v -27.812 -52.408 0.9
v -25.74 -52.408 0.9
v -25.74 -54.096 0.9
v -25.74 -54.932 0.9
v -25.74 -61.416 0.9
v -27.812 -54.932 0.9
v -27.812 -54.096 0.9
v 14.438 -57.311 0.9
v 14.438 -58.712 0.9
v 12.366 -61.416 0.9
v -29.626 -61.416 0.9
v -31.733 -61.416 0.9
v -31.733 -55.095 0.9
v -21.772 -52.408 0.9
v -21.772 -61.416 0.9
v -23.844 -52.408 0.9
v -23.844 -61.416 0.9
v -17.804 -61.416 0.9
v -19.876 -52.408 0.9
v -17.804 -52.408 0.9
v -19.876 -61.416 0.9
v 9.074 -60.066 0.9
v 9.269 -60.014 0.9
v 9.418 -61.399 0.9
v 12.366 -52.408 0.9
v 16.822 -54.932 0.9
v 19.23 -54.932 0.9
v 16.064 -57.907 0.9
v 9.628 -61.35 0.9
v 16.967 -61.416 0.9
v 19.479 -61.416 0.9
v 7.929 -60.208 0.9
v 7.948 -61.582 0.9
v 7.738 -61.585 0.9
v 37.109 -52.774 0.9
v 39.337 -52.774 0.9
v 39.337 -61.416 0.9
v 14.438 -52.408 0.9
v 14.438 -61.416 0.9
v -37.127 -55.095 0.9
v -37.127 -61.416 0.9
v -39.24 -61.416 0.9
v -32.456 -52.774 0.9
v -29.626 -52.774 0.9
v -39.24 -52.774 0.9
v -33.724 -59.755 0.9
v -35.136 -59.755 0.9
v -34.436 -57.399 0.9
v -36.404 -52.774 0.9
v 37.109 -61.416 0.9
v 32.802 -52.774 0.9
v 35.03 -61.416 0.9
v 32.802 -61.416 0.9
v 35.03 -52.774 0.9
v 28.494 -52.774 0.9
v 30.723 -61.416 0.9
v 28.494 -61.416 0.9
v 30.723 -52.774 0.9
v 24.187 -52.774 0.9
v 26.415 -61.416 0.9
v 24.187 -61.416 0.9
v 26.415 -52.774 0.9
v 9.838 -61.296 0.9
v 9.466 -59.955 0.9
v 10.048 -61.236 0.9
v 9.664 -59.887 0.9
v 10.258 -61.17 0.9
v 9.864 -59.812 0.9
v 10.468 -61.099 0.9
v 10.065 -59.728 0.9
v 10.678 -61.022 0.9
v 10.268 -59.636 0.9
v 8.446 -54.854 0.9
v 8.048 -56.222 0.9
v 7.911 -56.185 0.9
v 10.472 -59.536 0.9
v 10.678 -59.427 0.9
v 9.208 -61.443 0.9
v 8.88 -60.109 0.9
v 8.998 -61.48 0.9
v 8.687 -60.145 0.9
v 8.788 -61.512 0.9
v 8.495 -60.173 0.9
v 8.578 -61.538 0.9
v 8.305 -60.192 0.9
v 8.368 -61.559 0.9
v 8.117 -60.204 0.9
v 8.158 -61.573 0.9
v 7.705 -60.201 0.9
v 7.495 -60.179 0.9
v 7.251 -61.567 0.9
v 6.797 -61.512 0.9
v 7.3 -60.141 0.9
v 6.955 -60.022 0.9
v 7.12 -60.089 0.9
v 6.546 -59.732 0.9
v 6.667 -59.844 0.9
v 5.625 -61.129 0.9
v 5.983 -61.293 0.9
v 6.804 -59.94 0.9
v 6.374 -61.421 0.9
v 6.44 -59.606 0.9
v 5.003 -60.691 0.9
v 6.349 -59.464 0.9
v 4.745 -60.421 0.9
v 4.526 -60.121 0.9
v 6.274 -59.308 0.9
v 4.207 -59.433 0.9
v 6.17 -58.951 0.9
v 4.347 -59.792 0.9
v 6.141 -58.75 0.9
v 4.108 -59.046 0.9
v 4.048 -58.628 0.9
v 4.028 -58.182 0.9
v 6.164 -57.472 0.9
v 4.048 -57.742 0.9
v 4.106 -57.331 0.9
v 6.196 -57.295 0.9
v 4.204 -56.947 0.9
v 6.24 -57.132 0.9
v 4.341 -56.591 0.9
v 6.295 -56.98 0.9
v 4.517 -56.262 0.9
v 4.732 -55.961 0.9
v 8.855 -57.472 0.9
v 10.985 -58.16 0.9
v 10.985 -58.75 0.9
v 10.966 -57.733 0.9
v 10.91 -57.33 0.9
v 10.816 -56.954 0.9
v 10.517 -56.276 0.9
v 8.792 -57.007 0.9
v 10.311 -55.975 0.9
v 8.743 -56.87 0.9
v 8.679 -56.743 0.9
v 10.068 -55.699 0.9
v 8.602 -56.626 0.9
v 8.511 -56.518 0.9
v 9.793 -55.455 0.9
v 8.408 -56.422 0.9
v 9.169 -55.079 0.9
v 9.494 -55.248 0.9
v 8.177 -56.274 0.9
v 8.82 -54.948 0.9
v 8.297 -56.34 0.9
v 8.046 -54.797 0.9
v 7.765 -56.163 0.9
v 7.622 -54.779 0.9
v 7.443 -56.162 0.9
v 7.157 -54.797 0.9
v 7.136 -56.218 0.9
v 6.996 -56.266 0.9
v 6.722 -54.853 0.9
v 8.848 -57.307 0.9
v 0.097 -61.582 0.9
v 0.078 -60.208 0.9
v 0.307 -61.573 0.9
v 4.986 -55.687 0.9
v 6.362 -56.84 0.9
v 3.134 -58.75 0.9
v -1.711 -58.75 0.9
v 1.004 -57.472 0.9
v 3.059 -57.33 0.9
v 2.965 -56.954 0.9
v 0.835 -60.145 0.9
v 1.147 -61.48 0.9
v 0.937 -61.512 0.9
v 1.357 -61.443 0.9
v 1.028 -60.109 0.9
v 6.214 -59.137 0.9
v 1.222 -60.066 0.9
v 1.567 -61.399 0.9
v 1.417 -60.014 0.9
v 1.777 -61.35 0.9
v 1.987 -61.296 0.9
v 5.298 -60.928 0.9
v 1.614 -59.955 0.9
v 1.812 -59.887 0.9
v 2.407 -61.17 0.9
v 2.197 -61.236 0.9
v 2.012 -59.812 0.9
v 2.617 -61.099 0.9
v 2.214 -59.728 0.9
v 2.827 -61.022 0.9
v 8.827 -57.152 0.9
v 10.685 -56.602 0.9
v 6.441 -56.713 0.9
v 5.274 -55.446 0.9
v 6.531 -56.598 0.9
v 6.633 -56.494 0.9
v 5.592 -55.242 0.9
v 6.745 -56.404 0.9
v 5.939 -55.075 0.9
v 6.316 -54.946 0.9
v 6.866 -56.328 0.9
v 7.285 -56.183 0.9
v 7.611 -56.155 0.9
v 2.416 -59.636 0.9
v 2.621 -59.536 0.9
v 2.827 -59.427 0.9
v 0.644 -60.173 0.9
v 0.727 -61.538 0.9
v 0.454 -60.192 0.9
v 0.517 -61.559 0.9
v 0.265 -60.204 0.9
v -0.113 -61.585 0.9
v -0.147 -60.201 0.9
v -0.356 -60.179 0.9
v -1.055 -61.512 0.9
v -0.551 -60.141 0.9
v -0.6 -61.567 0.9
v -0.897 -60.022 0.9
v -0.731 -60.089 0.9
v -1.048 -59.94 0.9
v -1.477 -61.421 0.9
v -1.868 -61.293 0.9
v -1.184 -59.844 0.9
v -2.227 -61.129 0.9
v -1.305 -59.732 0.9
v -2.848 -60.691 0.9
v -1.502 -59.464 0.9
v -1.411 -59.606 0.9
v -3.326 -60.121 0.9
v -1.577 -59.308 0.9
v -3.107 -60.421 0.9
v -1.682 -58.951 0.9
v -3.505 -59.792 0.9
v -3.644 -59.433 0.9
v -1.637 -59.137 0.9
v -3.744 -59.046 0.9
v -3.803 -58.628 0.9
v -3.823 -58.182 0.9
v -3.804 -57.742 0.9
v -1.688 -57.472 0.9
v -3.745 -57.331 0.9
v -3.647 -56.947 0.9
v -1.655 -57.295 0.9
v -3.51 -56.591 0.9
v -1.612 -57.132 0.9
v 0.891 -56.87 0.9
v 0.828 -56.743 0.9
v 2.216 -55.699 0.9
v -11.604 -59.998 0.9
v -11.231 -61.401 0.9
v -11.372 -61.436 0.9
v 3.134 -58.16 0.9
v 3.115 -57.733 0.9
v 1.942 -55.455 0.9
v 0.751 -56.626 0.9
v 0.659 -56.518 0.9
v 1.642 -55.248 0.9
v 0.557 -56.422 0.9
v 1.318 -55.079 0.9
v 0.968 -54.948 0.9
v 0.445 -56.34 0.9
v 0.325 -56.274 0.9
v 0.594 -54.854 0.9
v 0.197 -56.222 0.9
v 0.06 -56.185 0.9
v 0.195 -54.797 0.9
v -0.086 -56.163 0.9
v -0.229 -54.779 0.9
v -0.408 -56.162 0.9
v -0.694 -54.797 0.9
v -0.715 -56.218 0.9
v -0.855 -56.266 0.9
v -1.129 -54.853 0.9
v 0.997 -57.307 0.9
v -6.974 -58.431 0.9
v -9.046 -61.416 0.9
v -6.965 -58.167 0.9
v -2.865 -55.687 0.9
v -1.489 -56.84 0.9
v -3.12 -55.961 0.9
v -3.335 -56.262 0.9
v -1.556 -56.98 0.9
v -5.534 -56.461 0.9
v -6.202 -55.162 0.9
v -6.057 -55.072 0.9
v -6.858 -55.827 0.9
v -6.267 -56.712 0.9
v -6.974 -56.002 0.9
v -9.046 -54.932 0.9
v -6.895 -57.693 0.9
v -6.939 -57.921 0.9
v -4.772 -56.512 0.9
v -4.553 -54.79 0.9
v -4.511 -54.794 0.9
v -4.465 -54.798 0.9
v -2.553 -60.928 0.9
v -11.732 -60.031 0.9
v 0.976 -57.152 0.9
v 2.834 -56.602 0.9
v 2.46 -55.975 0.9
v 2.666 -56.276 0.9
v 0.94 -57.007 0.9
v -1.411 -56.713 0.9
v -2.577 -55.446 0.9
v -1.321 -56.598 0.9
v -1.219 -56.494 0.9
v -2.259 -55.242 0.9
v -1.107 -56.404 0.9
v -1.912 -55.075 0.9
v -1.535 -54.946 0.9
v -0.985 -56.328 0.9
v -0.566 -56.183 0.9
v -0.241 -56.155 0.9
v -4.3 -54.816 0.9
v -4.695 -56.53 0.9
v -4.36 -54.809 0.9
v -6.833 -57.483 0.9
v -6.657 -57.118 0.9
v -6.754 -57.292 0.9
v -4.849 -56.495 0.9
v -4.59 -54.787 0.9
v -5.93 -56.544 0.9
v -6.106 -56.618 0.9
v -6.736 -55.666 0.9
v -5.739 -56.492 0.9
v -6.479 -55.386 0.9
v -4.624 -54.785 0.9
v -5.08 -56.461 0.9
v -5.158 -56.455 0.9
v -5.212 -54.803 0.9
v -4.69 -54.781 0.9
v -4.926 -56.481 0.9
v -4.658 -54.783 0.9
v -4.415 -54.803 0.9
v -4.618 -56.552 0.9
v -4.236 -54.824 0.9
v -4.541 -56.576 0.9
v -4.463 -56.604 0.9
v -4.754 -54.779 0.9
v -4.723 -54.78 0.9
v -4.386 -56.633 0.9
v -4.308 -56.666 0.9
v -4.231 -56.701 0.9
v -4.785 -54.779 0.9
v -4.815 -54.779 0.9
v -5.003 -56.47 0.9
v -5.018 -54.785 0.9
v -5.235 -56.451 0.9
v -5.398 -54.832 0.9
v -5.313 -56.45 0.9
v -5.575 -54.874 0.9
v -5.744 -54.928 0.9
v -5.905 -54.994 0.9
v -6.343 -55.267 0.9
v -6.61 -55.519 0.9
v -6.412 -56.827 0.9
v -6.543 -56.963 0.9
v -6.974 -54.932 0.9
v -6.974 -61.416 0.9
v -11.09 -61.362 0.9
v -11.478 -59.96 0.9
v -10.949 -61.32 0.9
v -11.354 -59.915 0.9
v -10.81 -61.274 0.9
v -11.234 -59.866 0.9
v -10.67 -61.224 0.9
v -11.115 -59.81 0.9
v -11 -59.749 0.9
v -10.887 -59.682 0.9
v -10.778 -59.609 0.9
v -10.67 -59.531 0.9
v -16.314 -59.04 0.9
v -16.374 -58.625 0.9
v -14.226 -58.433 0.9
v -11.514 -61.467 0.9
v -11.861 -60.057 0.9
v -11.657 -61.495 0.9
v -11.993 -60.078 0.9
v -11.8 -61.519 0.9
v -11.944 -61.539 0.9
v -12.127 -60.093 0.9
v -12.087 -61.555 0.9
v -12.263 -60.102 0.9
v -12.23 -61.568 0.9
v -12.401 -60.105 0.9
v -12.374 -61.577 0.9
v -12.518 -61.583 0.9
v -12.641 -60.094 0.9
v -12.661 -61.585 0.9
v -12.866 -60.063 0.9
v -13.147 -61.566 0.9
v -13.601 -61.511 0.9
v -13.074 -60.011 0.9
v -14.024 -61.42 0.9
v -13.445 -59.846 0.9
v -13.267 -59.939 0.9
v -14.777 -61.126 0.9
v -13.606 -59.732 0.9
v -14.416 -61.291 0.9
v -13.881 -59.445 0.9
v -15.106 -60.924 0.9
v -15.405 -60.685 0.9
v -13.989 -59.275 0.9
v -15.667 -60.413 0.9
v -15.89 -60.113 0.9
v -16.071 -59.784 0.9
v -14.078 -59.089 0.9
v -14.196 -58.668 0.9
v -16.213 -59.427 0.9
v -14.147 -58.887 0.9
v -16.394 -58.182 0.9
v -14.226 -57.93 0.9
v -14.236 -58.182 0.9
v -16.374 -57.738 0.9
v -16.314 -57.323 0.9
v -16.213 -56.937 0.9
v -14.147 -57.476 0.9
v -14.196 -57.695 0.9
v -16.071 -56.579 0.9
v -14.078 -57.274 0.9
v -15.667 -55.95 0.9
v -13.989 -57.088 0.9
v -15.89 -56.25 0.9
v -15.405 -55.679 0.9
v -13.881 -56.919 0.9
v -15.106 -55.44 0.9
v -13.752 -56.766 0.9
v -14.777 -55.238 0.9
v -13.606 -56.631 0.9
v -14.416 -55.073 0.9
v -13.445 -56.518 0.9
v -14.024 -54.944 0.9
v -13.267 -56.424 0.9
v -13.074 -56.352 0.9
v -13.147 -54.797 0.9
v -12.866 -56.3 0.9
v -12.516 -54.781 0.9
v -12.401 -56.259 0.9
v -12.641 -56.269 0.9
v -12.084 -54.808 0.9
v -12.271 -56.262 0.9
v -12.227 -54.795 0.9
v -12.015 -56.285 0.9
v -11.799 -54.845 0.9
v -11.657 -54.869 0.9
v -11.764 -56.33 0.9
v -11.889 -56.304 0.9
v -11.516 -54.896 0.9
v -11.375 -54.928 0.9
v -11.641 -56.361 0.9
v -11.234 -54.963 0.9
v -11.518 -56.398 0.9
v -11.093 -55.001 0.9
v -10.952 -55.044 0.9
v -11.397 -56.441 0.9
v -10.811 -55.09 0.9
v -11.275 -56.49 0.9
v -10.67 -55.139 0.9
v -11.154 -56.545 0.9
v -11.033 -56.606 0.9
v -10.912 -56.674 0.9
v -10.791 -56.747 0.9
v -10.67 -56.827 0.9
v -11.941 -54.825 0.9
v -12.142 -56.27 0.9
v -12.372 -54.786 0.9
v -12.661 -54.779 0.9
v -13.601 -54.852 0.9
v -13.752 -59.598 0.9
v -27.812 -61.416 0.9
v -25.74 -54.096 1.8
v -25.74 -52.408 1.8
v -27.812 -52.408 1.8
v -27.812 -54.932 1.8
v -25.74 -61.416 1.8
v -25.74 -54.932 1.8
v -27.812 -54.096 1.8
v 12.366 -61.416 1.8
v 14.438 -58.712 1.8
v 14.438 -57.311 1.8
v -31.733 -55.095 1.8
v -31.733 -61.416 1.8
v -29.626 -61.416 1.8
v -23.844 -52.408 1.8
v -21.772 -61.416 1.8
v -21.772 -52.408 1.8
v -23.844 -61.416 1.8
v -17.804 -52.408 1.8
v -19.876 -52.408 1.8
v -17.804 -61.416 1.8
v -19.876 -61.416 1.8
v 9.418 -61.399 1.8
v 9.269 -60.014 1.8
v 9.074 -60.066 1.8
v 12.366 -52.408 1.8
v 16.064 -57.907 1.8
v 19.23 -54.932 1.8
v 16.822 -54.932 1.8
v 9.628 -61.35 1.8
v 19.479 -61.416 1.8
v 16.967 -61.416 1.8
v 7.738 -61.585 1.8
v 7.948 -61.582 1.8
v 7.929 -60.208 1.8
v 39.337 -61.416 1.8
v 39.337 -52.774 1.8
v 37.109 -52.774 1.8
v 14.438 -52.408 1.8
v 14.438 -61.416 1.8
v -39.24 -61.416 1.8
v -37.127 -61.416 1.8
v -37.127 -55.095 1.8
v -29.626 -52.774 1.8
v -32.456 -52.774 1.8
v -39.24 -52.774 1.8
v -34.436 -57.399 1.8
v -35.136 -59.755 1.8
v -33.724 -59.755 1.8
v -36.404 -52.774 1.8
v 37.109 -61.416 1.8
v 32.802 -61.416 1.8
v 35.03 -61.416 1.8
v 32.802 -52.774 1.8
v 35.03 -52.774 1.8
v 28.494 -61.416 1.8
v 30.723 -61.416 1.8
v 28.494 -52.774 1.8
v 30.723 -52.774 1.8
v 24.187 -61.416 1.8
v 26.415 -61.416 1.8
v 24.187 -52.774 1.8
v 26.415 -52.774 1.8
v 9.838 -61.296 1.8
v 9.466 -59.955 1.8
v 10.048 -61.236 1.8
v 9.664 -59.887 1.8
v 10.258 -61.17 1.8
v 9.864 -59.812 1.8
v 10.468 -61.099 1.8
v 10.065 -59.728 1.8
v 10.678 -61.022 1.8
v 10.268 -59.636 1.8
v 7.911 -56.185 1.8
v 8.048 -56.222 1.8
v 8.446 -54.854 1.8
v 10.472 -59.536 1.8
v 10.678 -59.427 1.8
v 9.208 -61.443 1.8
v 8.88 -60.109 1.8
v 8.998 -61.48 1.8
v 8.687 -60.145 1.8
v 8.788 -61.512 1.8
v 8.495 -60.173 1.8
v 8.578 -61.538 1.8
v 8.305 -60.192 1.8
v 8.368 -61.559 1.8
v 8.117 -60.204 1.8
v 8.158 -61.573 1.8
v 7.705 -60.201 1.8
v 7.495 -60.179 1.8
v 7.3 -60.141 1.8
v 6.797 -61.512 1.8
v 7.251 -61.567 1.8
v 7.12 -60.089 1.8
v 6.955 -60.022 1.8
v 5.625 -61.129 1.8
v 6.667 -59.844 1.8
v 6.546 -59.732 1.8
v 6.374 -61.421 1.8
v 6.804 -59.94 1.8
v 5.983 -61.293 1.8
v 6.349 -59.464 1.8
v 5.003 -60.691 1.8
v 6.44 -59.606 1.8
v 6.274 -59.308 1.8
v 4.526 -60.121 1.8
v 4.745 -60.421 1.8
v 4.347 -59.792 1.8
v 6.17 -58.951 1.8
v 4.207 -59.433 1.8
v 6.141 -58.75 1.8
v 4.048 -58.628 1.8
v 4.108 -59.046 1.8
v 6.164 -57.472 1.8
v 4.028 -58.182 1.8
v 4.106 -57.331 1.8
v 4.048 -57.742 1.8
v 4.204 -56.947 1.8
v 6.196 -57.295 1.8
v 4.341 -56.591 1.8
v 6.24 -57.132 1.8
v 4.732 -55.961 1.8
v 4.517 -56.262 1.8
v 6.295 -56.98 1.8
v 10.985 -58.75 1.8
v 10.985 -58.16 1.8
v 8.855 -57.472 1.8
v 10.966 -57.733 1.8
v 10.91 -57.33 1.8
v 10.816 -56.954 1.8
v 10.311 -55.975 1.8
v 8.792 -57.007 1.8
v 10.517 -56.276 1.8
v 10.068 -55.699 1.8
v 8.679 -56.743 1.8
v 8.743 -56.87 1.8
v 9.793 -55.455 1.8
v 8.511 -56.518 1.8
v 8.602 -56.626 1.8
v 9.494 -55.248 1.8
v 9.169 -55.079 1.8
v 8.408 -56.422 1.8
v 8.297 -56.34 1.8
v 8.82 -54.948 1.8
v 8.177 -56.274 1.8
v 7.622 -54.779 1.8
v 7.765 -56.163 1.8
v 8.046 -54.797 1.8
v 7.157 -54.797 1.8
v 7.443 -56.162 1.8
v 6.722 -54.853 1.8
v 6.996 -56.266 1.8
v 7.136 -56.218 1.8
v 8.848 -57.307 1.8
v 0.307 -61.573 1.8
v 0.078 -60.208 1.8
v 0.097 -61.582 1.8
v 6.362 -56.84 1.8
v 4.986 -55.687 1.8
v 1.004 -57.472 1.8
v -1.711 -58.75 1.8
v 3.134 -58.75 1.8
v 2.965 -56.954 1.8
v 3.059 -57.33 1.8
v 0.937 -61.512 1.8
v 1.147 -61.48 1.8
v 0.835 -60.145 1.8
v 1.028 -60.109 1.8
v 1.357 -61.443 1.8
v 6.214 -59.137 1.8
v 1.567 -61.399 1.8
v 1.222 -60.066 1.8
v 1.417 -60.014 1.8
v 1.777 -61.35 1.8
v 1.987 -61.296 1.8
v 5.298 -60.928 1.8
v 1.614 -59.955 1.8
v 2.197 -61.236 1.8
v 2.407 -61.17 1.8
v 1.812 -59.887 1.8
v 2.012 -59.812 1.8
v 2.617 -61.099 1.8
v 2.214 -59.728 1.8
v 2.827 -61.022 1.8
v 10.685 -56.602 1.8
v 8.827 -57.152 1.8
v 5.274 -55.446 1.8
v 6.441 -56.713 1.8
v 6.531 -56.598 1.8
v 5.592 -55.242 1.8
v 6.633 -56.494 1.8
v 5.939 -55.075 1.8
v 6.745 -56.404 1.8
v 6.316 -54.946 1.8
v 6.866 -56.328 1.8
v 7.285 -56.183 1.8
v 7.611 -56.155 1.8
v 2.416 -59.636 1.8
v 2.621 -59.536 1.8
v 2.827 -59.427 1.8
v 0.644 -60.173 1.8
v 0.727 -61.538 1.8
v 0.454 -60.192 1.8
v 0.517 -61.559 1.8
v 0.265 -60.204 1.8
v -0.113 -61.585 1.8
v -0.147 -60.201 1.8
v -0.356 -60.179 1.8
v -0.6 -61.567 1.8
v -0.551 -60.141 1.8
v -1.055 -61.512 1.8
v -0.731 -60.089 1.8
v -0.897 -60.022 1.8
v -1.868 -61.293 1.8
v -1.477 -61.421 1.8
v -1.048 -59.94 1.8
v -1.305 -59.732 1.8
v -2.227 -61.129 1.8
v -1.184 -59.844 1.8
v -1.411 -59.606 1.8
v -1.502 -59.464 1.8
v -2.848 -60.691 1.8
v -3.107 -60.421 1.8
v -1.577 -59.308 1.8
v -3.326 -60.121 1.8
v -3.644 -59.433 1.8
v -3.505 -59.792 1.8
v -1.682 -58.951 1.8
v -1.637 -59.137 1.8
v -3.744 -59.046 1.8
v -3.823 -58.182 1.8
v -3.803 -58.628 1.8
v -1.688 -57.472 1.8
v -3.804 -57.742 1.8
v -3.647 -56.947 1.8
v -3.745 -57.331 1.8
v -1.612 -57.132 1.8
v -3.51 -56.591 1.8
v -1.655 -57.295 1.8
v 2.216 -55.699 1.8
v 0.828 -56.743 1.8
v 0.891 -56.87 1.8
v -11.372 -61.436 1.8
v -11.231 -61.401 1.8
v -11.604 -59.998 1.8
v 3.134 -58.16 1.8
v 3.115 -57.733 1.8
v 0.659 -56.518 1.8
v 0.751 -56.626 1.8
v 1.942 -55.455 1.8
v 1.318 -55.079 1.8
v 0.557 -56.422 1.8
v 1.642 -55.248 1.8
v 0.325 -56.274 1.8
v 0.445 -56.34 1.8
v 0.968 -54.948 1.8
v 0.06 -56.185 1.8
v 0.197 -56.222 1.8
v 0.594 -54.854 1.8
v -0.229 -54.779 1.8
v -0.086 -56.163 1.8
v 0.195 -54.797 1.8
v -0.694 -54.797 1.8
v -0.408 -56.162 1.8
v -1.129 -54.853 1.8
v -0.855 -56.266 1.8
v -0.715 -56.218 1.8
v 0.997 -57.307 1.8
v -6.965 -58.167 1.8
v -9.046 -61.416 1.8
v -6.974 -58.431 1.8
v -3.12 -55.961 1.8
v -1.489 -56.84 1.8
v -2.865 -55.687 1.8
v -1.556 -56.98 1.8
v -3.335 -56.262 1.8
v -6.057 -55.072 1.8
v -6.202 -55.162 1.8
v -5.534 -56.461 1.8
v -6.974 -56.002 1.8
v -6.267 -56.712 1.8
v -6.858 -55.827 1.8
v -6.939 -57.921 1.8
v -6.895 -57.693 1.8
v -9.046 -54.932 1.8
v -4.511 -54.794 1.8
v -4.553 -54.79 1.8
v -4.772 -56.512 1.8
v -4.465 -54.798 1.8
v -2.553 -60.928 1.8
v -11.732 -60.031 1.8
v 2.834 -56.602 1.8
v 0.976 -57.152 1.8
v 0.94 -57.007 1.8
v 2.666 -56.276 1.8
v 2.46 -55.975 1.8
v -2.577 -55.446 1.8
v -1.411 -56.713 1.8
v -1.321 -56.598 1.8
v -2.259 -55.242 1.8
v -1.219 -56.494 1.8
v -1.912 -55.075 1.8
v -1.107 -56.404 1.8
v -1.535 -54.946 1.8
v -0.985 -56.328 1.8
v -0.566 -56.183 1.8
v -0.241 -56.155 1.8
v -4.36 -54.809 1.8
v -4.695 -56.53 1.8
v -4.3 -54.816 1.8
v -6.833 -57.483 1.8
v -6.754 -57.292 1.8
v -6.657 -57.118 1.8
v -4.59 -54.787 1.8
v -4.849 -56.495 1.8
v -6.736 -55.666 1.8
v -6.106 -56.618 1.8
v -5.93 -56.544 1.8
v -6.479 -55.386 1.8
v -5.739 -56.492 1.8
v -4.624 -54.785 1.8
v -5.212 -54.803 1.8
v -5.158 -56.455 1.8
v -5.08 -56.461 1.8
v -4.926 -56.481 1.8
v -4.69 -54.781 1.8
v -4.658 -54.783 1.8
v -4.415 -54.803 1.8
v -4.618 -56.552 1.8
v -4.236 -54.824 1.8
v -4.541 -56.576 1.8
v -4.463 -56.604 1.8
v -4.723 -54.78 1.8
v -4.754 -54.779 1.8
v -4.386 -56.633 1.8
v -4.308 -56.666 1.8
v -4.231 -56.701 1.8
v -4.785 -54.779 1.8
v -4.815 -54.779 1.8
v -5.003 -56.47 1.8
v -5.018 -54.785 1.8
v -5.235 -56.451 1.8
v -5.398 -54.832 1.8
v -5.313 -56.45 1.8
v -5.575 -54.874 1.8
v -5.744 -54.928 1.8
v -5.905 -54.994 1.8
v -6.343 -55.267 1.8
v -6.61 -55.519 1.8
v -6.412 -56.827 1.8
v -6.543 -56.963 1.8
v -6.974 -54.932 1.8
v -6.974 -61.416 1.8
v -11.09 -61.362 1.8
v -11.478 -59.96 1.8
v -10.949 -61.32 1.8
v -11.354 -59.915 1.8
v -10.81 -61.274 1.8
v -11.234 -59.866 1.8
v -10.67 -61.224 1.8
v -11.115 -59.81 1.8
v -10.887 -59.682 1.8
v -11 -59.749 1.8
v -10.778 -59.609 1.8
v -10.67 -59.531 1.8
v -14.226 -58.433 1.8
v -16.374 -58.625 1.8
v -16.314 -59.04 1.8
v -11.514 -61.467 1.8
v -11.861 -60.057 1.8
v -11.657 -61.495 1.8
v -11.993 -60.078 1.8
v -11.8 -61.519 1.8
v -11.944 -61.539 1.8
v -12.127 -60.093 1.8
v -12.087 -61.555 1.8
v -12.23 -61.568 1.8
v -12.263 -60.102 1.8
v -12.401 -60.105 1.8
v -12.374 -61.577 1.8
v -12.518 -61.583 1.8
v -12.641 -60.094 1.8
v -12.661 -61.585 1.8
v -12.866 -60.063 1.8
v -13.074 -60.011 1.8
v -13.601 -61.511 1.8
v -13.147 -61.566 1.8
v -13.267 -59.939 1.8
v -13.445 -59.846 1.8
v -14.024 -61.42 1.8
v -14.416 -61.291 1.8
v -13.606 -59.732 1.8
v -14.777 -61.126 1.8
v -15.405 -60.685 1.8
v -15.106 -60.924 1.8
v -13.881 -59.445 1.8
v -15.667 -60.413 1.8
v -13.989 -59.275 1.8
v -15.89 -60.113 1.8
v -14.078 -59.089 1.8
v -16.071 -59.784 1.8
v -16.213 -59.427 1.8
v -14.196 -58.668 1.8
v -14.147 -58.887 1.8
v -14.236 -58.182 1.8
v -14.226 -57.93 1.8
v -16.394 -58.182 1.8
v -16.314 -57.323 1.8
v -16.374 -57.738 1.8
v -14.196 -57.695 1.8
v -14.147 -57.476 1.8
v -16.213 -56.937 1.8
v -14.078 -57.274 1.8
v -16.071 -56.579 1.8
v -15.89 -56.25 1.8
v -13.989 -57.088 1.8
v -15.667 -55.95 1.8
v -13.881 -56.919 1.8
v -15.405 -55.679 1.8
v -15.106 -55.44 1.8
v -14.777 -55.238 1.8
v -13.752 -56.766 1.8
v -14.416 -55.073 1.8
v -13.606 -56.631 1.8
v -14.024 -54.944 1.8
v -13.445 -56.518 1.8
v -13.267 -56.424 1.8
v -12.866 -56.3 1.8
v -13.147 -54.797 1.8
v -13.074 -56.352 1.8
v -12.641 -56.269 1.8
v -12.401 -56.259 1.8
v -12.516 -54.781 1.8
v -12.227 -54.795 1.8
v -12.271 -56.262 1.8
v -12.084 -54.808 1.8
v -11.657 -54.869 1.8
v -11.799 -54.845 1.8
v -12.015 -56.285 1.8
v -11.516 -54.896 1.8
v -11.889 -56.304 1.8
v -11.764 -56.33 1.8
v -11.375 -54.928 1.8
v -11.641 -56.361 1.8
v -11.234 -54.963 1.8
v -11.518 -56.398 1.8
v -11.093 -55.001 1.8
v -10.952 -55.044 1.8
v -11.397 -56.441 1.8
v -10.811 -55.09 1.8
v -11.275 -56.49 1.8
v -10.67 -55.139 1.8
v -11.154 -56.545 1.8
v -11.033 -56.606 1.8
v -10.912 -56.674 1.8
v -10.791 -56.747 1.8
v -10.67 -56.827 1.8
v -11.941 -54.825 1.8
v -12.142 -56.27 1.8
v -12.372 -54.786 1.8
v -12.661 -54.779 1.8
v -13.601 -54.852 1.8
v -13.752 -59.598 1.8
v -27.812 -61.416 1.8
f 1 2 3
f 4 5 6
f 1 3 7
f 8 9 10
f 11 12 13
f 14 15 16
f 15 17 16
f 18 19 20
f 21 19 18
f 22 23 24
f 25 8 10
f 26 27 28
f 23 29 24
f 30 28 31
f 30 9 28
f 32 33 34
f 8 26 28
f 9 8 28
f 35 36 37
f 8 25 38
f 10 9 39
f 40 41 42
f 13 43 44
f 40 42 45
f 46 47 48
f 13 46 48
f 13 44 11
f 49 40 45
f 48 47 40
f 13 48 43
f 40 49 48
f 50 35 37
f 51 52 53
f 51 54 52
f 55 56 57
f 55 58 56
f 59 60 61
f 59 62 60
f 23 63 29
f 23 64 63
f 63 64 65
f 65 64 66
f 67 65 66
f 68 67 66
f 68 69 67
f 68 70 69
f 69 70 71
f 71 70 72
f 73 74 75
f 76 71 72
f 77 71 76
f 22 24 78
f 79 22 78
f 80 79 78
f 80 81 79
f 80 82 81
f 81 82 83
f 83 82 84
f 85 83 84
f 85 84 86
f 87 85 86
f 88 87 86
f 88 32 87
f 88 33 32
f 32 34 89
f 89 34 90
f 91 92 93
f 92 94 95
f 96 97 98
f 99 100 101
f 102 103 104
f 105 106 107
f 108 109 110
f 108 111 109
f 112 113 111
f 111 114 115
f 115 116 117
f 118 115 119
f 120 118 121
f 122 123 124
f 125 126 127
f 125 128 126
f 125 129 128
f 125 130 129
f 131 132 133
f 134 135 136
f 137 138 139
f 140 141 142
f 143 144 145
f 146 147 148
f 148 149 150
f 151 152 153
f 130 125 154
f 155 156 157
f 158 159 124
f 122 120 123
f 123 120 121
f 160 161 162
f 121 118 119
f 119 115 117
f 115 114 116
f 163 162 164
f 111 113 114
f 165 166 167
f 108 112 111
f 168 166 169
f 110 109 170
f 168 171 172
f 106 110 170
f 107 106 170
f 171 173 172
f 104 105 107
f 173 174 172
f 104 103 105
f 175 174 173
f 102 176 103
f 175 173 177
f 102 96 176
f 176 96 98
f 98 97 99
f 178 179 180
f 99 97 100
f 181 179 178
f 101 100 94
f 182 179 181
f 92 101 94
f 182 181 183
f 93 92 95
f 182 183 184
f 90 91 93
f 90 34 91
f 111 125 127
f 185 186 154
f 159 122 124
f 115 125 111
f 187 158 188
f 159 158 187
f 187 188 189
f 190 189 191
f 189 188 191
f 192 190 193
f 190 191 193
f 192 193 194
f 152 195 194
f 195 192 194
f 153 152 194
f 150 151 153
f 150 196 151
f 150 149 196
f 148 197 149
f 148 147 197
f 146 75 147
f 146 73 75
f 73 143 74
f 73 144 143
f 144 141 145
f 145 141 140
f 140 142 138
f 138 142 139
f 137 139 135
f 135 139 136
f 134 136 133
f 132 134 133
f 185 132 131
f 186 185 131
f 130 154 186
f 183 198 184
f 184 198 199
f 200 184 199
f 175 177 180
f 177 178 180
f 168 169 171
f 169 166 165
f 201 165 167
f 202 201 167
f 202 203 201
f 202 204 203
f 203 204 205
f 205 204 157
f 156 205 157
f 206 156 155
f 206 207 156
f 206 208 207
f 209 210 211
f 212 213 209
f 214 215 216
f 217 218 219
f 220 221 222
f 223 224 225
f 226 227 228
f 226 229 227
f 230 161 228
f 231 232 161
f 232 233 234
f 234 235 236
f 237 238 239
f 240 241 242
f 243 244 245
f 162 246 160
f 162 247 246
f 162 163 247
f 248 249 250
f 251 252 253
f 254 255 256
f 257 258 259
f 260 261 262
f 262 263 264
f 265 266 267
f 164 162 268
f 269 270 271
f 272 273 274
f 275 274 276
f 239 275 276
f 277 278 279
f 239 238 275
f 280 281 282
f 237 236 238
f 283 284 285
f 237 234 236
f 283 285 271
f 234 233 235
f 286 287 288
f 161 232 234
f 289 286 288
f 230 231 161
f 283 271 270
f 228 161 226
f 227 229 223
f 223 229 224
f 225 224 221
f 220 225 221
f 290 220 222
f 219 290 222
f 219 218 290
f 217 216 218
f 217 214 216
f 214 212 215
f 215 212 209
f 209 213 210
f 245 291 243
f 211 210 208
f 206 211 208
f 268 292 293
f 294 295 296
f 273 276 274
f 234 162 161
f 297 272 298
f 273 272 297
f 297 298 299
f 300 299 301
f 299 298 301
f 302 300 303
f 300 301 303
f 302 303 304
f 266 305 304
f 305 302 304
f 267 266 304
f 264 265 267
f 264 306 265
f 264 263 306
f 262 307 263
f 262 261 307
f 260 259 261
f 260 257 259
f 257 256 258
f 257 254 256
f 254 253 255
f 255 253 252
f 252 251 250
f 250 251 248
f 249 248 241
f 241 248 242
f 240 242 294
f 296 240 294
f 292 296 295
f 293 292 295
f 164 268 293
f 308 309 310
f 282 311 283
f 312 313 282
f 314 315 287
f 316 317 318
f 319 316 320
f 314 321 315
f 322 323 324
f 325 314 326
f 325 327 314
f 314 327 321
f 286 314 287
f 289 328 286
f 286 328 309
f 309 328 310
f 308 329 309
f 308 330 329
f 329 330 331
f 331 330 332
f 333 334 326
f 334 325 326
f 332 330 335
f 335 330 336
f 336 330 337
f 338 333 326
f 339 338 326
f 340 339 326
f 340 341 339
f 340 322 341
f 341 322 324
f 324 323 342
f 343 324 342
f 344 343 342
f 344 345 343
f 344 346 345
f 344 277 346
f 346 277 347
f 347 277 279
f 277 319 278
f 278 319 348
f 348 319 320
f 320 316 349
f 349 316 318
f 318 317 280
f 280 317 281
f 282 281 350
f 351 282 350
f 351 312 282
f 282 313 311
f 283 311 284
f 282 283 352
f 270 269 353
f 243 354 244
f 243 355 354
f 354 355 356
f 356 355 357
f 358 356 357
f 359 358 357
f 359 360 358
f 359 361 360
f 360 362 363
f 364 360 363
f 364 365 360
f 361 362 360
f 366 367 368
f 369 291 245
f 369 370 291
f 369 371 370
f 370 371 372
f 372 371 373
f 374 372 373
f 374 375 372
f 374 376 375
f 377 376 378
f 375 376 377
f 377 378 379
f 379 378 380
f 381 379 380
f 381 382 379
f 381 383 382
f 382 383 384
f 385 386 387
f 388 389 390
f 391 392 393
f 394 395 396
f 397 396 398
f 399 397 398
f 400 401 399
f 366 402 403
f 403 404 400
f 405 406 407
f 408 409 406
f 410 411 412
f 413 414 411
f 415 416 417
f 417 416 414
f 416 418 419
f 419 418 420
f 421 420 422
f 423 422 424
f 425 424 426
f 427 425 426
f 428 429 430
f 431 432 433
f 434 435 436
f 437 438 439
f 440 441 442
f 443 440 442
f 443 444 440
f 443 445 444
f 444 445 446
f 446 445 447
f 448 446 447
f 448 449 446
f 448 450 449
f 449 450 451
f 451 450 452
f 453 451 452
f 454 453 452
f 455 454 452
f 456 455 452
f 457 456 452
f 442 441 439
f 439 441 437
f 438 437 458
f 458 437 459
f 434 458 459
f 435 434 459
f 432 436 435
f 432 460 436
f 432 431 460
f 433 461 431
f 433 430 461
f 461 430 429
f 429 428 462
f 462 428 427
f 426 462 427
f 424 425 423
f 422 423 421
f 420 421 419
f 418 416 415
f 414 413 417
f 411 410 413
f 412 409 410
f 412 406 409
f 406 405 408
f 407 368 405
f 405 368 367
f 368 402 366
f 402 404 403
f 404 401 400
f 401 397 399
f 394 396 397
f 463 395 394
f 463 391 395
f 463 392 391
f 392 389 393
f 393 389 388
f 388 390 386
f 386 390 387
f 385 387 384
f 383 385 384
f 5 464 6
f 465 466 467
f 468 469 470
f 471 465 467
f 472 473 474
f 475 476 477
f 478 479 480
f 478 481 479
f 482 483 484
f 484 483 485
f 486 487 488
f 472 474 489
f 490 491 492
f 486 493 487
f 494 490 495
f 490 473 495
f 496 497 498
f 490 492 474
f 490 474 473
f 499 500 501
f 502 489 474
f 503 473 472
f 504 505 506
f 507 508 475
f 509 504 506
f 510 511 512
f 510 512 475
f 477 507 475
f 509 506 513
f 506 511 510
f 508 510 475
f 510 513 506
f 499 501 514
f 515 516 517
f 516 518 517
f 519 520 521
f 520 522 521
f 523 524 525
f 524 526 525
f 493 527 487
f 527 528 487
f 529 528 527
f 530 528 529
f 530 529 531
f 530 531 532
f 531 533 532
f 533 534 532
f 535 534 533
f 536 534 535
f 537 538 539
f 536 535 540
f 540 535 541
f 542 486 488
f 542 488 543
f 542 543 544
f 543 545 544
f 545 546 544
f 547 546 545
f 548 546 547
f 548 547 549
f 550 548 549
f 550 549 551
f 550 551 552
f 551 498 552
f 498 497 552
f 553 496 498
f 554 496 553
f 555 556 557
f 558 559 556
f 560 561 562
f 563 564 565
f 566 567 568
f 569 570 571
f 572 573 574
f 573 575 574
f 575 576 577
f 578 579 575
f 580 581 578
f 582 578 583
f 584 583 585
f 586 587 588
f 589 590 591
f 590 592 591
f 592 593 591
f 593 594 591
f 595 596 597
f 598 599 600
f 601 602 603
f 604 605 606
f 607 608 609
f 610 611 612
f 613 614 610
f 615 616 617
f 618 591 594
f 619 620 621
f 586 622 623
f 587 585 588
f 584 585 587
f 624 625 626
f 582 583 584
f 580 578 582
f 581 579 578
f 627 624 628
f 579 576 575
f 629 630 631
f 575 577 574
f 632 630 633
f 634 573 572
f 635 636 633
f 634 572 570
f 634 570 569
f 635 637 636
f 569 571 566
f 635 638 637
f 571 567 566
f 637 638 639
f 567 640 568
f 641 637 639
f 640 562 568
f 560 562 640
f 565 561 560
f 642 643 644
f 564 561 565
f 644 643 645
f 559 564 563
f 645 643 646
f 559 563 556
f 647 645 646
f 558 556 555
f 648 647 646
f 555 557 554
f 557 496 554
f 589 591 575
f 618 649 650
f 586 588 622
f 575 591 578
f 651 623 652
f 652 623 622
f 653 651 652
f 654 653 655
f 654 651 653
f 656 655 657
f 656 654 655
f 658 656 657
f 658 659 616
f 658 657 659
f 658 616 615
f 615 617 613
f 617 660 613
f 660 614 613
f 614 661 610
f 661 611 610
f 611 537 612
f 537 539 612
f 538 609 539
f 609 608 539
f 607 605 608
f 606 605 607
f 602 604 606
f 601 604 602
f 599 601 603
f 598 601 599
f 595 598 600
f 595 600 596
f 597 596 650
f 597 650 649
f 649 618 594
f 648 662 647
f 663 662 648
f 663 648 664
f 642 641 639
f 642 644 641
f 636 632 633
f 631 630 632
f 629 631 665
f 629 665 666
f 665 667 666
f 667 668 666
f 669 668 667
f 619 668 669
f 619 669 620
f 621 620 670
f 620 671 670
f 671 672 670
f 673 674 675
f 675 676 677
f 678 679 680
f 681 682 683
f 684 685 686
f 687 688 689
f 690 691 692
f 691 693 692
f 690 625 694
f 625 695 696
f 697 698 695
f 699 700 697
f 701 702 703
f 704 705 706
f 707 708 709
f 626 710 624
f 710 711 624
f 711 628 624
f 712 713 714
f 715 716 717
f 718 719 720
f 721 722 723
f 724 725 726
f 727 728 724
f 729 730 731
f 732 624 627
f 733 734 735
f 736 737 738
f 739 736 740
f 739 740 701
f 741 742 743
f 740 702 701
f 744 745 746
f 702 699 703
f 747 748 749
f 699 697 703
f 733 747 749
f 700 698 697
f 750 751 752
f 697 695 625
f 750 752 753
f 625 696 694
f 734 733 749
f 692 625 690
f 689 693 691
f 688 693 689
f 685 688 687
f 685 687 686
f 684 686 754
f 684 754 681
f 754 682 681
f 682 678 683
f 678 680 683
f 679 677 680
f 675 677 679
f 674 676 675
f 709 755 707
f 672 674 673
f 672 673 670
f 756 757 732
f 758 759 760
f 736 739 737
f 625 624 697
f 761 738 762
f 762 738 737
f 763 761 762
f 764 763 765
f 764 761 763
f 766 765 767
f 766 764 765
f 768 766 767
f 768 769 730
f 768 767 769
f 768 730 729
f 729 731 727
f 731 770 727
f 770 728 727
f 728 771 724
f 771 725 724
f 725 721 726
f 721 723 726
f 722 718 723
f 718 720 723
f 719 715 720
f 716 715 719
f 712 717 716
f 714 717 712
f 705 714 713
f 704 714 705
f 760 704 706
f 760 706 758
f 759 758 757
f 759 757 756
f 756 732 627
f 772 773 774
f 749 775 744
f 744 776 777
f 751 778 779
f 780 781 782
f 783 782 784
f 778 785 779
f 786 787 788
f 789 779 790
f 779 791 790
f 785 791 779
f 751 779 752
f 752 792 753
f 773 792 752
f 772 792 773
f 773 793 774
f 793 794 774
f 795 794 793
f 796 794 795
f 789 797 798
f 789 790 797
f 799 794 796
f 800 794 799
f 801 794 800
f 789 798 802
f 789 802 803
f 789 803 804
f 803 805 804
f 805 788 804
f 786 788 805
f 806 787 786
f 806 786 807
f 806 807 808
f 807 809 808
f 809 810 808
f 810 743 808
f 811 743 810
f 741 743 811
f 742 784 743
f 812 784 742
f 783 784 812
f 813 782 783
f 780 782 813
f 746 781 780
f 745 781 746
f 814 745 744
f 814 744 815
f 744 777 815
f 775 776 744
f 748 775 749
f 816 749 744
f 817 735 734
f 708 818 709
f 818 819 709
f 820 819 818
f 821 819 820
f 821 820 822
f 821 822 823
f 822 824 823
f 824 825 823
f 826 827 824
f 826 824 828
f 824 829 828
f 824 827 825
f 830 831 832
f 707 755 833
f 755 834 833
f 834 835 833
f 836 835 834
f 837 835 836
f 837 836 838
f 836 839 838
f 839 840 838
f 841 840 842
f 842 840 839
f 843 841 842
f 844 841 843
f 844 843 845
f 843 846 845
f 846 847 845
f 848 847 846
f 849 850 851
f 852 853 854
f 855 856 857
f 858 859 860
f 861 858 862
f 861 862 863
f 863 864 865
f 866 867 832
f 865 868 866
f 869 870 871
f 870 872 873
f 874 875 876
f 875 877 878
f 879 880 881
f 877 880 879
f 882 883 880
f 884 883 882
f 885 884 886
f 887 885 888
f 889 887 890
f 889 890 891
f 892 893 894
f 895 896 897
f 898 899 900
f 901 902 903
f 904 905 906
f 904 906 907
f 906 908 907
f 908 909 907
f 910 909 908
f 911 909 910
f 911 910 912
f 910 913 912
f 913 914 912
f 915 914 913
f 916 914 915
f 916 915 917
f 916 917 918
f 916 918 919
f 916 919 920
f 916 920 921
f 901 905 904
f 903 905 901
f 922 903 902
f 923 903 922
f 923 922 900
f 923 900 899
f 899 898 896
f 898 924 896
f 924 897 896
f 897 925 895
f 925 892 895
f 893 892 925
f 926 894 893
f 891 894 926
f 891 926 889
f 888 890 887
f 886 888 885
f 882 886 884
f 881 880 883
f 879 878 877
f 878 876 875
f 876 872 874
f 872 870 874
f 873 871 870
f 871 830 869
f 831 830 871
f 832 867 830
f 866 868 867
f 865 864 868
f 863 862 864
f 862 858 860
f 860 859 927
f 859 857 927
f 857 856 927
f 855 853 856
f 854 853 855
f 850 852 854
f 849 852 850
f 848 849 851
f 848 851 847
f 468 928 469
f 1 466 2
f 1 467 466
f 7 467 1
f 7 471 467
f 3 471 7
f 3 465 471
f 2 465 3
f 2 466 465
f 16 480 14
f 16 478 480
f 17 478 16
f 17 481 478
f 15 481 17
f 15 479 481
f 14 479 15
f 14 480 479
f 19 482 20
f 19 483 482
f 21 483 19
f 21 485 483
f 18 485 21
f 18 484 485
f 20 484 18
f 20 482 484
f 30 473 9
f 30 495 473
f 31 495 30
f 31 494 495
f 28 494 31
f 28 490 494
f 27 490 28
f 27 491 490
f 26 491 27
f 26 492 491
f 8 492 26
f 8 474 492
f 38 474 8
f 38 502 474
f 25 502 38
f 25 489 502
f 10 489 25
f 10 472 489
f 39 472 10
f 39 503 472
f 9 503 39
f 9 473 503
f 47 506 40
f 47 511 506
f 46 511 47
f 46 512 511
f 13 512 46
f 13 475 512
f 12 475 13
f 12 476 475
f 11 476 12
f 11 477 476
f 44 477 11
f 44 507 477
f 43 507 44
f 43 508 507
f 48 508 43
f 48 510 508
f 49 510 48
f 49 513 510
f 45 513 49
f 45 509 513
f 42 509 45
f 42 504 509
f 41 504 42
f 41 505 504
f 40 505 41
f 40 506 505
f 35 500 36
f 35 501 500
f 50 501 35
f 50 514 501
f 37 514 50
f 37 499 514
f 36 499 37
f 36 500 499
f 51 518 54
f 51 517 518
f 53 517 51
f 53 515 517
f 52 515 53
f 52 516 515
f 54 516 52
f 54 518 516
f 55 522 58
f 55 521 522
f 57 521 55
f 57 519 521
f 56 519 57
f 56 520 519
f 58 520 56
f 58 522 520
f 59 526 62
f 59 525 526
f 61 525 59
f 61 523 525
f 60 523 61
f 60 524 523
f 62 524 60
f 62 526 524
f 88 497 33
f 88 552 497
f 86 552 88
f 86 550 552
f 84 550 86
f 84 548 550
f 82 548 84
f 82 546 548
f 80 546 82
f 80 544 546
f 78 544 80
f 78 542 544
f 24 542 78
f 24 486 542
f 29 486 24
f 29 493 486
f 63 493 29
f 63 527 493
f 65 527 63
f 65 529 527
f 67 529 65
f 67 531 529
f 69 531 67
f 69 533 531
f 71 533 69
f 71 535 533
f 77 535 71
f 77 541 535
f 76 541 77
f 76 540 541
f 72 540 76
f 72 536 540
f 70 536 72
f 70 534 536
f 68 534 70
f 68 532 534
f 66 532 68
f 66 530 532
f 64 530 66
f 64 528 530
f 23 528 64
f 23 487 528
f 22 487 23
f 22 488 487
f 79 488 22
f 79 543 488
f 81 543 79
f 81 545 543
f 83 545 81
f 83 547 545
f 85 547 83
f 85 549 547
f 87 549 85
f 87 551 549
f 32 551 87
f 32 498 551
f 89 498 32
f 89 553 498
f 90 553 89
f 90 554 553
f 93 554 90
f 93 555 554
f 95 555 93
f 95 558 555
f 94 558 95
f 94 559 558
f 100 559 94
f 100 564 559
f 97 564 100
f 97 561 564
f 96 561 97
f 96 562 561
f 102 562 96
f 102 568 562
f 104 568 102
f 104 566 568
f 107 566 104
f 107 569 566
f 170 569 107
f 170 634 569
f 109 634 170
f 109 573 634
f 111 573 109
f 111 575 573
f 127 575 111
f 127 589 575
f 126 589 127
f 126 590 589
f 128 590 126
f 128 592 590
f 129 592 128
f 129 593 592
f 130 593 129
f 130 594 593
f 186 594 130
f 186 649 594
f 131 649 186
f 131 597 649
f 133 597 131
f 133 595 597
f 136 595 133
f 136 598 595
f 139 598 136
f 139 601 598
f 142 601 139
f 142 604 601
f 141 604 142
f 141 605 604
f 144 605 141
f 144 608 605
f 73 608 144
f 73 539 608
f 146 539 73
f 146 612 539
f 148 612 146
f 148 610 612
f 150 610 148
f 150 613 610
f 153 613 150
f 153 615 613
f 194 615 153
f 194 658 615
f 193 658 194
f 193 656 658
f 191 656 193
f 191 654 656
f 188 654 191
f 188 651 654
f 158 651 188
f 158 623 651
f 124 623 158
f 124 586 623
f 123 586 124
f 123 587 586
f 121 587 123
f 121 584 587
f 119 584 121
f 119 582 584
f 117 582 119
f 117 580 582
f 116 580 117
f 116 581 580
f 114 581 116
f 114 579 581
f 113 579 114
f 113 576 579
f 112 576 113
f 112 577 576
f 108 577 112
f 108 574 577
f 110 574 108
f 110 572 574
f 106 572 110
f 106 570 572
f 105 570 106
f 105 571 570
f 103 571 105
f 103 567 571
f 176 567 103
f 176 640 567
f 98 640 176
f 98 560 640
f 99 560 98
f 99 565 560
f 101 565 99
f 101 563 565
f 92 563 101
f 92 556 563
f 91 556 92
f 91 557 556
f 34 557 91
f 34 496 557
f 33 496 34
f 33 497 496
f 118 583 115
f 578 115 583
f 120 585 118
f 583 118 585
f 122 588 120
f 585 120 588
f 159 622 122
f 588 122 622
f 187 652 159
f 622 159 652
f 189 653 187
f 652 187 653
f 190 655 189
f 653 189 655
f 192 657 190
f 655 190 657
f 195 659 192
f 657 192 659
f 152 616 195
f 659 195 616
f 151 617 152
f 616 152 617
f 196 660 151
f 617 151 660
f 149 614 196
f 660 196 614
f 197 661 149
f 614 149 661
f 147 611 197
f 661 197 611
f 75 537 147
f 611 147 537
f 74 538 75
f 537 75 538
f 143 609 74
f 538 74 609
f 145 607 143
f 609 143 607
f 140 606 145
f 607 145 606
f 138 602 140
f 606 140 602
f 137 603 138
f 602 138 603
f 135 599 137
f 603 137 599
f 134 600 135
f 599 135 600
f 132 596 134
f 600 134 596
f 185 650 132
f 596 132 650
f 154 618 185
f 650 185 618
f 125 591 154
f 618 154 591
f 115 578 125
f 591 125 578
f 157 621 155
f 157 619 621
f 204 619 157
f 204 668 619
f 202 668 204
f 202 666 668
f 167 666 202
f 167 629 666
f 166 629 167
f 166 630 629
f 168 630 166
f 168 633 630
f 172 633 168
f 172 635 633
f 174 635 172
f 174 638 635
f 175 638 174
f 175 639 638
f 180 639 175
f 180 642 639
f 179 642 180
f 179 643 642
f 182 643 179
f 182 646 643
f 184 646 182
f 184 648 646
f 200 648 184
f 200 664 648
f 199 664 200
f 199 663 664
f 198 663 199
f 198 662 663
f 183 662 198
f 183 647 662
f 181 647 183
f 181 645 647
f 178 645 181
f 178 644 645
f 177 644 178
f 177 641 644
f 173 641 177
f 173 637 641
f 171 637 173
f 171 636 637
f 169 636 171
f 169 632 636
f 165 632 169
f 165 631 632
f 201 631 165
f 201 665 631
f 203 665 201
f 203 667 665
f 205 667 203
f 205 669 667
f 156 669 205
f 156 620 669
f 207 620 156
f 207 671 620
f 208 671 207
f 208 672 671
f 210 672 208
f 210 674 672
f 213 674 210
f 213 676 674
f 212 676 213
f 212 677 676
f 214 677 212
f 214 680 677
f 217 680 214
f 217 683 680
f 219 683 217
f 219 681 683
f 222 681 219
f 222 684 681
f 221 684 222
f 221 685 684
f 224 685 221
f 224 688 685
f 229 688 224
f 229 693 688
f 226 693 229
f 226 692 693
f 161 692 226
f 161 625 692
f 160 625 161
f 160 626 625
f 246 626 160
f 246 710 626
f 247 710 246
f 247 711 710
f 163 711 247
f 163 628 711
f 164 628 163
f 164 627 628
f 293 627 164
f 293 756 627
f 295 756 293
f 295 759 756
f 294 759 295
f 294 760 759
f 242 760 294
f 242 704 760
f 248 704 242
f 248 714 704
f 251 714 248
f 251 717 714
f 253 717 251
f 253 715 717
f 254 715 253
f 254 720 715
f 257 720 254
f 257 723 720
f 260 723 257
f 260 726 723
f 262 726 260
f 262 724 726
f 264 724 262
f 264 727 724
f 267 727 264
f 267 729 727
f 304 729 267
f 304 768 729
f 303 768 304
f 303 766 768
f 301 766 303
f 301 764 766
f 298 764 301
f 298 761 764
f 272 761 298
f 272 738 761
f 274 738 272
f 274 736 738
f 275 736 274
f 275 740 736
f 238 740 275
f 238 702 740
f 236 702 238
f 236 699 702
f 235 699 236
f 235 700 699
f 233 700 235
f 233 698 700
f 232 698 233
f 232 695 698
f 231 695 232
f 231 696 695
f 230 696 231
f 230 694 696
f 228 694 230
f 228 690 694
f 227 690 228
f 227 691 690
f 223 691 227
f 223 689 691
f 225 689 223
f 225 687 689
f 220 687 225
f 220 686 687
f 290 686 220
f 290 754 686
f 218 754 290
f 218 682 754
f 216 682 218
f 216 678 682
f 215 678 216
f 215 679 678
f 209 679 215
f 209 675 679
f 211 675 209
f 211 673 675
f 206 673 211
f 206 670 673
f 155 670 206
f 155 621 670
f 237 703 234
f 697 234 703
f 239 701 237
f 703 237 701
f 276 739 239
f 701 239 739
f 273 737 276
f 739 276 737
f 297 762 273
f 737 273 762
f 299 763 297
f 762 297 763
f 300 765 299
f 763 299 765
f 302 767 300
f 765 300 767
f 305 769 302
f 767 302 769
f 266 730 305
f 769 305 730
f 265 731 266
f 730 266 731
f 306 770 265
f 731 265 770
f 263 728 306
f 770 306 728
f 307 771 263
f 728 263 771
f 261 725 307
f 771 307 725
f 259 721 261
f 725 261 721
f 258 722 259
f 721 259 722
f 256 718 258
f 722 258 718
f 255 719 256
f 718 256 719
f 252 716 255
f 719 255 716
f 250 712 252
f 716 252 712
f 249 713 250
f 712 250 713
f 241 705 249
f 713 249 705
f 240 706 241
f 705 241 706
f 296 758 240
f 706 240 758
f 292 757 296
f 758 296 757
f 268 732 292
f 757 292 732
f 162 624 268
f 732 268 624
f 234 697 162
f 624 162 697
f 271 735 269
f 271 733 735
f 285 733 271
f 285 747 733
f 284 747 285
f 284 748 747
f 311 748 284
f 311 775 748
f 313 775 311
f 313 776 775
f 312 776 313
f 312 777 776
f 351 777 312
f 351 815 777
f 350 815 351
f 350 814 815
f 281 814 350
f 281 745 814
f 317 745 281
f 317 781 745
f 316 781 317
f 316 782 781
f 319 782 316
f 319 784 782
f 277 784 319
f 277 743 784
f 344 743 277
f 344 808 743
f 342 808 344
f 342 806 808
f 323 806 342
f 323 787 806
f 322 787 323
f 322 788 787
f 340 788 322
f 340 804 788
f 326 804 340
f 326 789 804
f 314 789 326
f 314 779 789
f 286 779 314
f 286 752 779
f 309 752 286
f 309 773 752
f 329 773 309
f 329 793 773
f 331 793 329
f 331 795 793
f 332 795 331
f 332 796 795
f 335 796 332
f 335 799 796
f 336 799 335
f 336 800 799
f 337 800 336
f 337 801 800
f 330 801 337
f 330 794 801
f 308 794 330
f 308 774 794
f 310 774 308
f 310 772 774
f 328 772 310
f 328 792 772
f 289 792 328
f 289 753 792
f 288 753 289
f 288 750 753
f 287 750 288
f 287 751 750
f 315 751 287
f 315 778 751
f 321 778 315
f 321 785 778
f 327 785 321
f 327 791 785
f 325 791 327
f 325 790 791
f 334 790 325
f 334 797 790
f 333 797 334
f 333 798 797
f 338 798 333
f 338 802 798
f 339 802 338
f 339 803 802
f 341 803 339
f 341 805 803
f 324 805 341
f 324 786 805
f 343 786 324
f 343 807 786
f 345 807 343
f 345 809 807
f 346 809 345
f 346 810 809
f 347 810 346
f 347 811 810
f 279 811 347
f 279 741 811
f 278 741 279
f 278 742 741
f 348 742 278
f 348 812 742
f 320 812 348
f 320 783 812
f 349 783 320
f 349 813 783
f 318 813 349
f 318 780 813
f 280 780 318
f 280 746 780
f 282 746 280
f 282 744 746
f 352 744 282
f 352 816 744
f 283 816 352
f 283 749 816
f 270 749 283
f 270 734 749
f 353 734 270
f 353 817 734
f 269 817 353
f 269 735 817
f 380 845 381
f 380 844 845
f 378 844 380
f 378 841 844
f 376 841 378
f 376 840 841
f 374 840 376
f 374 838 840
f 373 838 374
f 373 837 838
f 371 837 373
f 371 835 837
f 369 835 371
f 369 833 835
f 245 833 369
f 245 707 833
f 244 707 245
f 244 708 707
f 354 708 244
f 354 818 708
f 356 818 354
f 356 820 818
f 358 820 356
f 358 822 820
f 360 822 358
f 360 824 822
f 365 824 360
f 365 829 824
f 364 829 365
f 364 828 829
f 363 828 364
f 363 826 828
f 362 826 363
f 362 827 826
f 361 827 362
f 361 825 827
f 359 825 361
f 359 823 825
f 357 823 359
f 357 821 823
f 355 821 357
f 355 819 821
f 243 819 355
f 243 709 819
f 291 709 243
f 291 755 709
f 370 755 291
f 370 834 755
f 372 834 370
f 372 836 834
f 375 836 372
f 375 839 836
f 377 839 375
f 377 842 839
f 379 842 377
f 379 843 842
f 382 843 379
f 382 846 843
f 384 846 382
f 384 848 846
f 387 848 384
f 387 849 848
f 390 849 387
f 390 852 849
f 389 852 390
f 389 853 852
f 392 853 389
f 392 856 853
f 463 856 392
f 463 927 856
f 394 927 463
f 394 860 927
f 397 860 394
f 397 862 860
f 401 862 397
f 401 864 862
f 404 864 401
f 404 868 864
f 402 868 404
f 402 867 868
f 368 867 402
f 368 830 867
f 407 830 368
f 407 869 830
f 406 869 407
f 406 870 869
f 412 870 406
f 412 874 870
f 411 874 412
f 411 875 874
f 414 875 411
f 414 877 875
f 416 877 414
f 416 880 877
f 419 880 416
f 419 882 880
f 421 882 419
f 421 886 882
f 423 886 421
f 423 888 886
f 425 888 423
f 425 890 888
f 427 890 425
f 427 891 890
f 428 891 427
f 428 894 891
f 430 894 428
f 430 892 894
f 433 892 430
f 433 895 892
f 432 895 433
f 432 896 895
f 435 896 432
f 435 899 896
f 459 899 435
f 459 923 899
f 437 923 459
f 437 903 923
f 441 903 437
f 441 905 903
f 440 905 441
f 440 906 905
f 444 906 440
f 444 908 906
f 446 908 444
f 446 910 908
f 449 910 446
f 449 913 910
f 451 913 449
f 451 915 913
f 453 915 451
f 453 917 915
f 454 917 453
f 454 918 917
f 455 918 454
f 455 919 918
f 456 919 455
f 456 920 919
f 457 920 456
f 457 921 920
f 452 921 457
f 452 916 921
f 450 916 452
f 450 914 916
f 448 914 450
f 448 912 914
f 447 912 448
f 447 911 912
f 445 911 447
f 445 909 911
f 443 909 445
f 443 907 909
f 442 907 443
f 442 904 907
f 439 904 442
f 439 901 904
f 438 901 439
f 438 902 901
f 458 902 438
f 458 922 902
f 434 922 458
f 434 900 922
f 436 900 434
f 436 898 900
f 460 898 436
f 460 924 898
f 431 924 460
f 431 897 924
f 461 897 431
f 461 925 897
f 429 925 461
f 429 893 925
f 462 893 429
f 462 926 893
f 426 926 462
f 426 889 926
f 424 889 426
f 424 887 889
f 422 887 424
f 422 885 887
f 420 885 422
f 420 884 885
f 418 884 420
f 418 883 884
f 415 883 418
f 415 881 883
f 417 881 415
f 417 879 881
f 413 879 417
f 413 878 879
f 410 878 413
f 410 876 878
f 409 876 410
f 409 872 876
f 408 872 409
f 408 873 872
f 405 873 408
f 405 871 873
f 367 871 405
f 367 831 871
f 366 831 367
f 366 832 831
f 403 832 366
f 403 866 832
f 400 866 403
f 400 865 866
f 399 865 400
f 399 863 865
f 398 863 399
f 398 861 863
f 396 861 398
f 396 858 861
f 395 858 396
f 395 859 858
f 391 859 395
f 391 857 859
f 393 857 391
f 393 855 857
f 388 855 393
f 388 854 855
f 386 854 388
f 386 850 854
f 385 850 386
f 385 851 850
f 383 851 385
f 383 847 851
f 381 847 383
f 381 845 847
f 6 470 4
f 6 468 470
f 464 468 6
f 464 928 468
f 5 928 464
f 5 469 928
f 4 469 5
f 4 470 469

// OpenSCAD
$fn = 48;
  // English (below bottom hole)
  translate([0, -57.100, 0.900]) linear_extrude(height=0.900) text("Millcreek IIII", size=8.535, halign="center", valign="center", font="Helvetica Neue:style=Bold");
